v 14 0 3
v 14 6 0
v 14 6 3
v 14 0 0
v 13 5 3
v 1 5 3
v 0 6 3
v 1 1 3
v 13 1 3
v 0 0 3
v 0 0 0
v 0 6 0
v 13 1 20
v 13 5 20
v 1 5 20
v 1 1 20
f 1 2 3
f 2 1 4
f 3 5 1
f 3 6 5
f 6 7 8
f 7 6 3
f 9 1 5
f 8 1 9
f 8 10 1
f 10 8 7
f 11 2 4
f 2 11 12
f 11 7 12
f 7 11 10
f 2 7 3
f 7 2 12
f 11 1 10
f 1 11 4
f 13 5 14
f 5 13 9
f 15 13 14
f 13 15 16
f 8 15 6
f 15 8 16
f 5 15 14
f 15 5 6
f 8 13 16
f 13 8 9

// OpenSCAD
// See botWidth = ___ + xx for depth of button required.
// Flush = 20mm for covered side
// sticking out = ...
// leave 1mm space to avoid always pressed.
buttonHeight = 20;


// Fatter base.
cube([14, 6, 4-1]);

translate([1, 1, 0]) {
    cube([12,4, buttonHeight]);
}
